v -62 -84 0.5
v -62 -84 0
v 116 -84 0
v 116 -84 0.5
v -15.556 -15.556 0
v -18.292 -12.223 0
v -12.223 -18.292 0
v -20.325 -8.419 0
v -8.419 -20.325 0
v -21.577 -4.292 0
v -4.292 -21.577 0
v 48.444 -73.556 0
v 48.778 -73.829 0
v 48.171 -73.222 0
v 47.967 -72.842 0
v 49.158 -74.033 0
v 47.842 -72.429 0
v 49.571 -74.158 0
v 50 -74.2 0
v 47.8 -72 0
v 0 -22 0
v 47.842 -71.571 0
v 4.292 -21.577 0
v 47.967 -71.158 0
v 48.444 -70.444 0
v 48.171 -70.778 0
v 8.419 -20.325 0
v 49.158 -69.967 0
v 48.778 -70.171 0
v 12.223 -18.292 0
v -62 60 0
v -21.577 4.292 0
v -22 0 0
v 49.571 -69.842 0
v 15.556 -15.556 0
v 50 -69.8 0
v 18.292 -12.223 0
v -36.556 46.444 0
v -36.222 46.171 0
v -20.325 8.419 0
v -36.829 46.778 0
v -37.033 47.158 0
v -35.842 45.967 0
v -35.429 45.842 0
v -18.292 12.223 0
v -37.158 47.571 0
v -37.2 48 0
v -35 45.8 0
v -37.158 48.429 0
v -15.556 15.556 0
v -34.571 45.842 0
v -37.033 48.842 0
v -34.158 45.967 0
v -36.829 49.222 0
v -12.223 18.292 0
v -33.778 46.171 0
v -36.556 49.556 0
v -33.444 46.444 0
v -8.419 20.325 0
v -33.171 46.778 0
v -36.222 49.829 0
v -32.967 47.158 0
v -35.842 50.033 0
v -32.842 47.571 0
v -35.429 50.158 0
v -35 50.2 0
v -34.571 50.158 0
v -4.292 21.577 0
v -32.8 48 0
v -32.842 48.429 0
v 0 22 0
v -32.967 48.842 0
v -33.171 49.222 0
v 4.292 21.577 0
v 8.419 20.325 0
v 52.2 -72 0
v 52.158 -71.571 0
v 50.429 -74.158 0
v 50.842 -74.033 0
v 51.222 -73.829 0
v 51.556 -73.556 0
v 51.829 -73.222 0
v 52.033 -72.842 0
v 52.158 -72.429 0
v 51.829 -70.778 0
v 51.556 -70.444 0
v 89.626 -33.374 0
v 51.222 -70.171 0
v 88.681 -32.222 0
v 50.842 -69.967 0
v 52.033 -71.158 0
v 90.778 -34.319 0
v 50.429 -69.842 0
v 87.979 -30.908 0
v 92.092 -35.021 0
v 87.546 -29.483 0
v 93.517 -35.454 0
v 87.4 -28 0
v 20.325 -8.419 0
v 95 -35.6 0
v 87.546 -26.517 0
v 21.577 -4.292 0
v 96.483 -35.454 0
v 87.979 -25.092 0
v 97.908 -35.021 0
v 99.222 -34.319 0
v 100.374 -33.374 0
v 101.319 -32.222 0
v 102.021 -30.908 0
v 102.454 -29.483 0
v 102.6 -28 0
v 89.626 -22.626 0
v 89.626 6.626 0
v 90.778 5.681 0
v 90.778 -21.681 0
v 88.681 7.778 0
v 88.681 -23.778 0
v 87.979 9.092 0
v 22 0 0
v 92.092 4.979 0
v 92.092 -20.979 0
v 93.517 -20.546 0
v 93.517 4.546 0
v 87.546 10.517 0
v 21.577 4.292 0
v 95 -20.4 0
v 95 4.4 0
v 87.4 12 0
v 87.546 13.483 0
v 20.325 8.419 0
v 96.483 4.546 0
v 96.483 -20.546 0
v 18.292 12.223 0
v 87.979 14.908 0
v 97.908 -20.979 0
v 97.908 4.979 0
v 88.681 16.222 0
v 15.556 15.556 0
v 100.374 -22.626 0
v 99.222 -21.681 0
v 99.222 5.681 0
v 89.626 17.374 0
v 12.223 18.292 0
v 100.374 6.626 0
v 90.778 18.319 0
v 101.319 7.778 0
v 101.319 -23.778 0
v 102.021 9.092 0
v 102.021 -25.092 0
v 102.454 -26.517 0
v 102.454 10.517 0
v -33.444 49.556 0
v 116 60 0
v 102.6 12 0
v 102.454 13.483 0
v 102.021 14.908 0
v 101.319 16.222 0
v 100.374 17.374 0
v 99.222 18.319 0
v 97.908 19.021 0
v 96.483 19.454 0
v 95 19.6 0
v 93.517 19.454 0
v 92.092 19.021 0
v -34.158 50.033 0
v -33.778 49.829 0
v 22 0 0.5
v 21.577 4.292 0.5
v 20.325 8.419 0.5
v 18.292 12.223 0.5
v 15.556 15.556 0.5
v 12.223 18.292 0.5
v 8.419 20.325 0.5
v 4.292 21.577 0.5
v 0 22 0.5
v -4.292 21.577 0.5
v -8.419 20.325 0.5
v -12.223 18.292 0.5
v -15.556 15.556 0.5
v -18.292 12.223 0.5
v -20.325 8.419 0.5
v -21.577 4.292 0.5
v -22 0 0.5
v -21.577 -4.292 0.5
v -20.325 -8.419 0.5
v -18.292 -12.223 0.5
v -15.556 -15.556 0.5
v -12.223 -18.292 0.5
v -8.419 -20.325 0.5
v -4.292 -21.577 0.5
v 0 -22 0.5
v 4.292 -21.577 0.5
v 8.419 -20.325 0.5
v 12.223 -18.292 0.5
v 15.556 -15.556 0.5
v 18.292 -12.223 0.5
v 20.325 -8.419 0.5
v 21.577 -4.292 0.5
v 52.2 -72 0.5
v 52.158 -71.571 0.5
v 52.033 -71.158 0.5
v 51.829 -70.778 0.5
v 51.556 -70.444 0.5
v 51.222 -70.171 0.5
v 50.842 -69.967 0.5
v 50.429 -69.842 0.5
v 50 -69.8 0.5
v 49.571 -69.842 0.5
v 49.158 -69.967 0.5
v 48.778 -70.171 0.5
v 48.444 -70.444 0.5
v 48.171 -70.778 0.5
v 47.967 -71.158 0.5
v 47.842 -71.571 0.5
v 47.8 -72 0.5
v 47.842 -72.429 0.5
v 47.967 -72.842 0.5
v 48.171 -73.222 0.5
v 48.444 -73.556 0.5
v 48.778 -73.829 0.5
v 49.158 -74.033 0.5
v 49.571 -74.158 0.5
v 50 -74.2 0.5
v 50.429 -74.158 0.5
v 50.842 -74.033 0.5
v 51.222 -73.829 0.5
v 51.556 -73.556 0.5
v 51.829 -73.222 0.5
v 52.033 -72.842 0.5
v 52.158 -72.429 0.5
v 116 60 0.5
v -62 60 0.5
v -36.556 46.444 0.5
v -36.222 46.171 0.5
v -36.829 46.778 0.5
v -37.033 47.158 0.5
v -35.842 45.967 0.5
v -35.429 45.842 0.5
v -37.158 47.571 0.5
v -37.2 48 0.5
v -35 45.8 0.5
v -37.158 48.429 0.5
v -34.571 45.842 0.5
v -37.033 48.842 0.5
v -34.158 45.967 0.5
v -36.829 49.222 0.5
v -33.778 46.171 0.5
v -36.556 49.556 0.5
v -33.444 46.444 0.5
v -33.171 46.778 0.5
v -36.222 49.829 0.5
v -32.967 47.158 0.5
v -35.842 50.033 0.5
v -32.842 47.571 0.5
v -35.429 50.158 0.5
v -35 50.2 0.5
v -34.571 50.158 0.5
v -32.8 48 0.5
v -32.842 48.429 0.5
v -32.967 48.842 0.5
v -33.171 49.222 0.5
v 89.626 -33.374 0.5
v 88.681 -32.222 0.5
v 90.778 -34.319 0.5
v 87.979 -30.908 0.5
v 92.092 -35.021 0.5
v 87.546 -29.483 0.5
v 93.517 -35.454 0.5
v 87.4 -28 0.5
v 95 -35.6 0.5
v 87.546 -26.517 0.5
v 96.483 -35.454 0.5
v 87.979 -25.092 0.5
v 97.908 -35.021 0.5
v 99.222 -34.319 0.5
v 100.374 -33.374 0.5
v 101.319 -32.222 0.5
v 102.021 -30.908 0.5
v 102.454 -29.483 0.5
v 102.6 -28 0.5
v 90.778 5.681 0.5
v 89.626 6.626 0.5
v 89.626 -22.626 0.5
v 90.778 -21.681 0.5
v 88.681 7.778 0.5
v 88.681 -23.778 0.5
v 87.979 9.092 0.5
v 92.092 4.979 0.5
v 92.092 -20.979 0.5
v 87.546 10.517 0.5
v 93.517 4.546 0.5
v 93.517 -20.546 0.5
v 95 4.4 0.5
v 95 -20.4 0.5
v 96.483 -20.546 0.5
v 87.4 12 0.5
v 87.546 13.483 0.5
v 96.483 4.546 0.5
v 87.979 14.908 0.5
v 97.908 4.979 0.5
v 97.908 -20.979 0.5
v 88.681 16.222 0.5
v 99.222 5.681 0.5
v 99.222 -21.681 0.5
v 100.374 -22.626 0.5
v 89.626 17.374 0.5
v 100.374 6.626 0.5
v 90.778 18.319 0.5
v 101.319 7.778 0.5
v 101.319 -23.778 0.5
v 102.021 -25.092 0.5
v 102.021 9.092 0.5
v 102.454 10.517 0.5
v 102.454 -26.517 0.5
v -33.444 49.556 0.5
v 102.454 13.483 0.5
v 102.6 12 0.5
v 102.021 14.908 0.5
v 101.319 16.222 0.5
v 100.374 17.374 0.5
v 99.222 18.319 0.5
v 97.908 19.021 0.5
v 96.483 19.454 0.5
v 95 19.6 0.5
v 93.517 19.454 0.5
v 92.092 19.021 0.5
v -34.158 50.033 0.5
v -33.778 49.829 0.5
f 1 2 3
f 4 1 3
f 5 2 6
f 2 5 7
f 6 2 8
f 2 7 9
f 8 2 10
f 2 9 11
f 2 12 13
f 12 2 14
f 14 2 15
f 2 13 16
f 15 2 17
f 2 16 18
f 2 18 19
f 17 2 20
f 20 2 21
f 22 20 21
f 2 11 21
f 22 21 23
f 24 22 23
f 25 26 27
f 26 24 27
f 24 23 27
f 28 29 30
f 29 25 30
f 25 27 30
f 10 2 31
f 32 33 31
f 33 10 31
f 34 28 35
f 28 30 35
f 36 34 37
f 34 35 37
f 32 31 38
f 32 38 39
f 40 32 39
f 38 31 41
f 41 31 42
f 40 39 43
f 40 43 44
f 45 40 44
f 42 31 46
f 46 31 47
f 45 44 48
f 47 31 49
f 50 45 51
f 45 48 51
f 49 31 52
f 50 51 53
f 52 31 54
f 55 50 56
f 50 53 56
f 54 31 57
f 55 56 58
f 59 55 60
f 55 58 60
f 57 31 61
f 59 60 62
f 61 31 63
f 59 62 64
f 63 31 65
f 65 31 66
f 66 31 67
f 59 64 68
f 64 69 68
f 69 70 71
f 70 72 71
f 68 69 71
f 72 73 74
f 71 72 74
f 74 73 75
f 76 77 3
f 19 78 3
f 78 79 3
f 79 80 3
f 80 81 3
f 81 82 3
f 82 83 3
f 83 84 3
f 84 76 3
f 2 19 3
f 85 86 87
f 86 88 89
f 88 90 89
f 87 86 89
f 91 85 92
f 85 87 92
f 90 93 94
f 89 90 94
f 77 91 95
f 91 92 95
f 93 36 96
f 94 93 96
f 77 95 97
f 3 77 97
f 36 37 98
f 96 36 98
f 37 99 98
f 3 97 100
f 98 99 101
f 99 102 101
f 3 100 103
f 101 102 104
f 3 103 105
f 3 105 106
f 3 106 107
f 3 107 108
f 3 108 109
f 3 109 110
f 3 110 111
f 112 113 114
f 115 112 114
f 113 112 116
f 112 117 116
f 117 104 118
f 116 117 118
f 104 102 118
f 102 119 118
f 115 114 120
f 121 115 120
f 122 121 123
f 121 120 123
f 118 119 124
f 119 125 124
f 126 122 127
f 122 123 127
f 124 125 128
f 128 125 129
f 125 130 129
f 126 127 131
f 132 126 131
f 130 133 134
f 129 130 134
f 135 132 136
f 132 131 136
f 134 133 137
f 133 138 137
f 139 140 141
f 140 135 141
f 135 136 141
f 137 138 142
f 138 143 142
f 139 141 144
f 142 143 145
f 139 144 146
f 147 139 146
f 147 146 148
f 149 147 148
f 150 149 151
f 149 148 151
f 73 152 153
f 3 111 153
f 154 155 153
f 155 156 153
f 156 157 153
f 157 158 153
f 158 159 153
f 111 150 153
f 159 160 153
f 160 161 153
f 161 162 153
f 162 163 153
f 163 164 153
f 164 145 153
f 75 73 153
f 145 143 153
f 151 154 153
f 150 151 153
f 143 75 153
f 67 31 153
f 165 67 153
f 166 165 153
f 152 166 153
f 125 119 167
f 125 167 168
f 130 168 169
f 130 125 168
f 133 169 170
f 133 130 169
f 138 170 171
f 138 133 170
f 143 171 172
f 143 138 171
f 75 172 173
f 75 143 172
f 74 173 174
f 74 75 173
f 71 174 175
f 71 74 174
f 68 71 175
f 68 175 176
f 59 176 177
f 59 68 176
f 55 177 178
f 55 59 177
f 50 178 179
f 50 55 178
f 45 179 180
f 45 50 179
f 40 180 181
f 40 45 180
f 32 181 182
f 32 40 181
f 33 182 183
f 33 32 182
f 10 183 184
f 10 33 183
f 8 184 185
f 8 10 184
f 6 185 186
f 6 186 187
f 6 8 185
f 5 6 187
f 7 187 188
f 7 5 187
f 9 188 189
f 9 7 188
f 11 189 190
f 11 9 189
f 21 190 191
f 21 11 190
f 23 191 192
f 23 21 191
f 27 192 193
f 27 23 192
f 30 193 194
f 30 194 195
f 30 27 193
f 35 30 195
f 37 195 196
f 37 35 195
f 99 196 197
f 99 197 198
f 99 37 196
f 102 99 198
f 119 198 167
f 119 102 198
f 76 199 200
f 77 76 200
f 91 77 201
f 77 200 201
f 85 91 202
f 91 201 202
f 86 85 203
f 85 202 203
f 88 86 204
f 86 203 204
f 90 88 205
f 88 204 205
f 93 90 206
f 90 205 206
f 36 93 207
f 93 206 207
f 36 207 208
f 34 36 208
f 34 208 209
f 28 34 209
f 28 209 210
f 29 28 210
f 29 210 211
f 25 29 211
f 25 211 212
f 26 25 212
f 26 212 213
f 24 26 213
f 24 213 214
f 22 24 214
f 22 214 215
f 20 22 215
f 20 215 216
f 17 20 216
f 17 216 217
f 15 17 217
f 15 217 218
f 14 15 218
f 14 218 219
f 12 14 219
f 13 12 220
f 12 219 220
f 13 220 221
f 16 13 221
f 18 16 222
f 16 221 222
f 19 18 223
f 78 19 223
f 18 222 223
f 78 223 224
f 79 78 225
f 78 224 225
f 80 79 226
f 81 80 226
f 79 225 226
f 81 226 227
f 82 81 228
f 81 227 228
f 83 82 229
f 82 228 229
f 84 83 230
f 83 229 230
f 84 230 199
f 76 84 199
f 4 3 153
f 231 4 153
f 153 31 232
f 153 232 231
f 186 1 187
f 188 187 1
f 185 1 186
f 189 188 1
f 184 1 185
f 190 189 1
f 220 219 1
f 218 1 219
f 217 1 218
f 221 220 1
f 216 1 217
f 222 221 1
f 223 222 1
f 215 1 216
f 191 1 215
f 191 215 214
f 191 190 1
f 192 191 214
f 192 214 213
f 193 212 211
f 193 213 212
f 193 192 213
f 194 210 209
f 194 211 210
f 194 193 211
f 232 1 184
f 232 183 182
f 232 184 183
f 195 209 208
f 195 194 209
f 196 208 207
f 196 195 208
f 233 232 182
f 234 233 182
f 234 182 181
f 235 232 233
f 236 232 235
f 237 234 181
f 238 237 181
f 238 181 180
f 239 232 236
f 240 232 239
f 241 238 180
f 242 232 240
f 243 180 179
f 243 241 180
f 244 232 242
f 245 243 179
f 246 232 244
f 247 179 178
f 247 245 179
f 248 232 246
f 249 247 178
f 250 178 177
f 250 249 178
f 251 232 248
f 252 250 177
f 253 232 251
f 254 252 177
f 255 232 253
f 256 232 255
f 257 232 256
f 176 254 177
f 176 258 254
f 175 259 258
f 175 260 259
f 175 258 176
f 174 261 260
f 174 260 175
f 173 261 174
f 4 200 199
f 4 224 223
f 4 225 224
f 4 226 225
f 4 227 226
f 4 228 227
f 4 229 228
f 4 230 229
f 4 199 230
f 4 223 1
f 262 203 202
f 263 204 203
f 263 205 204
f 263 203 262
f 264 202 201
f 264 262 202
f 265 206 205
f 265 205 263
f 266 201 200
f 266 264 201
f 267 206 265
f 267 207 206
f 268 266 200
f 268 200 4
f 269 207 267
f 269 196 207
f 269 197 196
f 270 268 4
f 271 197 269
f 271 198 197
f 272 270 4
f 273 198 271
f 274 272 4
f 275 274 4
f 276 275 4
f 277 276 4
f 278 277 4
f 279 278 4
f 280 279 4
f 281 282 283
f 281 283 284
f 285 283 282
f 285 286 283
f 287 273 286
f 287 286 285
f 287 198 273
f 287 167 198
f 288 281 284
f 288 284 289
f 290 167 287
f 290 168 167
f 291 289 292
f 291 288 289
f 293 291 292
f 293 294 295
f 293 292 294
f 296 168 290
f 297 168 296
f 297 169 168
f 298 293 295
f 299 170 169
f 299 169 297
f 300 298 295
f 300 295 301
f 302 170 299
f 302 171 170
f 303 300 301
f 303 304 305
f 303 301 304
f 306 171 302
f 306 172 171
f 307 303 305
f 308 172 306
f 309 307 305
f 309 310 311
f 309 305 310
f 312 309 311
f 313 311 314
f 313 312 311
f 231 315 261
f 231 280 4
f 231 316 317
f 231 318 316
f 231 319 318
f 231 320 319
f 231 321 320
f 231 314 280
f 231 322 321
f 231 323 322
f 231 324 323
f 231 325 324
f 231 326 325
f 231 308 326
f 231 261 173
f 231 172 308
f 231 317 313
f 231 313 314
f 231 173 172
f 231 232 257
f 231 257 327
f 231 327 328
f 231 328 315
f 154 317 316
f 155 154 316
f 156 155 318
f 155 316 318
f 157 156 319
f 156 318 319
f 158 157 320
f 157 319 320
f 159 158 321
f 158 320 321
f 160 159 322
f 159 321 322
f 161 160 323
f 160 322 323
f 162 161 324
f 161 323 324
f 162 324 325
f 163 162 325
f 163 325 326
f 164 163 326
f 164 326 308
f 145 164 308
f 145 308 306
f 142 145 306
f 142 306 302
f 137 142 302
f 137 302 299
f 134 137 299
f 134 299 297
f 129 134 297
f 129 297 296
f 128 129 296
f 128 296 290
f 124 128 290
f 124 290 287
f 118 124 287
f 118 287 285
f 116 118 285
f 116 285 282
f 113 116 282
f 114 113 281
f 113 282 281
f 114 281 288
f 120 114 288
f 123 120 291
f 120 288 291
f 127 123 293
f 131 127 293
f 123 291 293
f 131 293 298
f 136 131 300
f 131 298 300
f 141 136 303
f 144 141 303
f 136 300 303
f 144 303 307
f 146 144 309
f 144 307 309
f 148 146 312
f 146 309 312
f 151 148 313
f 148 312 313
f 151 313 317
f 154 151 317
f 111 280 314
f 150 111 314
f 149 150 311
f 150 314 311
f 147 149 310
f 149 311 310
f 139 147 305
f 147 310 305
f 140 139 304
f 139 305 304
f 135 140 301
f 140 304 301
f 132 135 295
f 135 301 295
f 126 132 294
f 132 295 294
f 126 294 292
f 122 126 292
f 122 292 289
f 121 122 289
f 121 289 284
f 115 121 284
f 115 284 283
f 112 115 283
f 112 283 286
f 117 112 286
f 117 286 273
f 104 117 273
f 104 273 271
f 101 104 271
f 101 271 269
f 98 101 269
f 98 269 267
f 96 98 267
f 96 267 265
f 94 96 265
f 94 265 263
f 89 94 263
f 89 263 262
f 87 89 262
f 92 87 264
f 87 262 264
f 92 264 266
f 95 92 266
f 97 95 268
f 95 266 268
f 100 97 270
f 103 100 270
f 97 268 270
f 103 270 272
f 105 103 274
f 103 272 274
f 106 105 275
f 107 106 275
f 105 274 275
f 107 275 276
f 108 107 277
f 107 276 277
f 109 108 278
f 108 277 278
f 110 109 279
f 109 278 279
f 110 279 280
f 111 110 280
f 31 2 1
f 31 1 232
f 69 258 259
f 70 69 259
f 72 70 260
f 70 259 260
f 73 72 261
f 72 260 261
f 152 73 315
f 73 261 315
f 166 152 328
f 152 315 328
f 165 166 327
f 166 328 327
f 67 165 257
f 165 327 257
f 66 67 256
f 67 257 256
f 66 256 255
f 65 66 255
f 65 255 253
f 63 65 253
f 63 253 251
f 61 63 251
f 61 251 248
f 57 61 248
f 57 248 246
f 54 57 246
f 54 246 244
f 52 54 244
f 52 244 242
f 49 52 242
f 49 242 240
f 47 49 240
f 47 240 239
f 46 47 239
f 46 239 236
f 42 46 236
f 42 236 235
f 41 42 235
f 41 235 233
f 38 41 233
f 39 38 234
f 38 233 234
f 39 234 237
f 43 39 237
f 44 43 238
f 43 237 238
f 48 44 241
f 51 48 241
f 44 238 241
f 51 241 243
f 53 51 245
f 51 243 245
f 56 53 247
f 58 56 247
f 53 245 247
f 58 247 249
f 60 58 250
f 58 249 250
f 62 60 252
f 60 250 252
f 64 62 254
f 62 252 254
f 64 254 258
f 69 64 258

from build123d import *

# Parameters (mm, degrees)
SKETCH_W        = 178
SKETCH_H        = 144
SKETCH_R        = 22
PAD_DEPTH       = 0.5
SKETCH001_R     = 2.2
POCKET_DEPTH    = 0.501
SKETCH002_R     = 7.6
POCKET001_DEPTH = 0.501


with BuildPart() as part:
    # Sketch → Pad (new body)
    with BuildSketch(Plane.XY):
        with Locations((27, -12)):
            Rectangle(SKETCH_W, SKETCH_H)
        Circle(SKETCH_R, mode=Mode.SUBTRACT)
    extrude(amount=PAD_DEPTH)

    # Sketch001 (on Face7 of Pad) → Pocket (cut, through all)
    with BuildSketch(Plane.XY.offset(0.5)):
        with Locations((-35, 48)):
            Circle(SKETCH001_R)
        with Locations((50, -72)):
            Circle(SKETCH001_R)
    extrude(amount=-POCKET_DEPTH, mode=Mode.SUBTRACT)

    # Sketch002 (on Face5 of Pocket) → Pocket001 (cut, through all)
    with BuildSketch(Plane.XY.offset(0.5)):
        with Locations((95, 12)):
            Circle(SKETCH002_R)
        with Locations((95, -28)):
            Circle(SKETCH002_R)
    extrude(amount=-POCKET001_DEPTH, mode=Mode.SUBTRACT)


solid = part.part
